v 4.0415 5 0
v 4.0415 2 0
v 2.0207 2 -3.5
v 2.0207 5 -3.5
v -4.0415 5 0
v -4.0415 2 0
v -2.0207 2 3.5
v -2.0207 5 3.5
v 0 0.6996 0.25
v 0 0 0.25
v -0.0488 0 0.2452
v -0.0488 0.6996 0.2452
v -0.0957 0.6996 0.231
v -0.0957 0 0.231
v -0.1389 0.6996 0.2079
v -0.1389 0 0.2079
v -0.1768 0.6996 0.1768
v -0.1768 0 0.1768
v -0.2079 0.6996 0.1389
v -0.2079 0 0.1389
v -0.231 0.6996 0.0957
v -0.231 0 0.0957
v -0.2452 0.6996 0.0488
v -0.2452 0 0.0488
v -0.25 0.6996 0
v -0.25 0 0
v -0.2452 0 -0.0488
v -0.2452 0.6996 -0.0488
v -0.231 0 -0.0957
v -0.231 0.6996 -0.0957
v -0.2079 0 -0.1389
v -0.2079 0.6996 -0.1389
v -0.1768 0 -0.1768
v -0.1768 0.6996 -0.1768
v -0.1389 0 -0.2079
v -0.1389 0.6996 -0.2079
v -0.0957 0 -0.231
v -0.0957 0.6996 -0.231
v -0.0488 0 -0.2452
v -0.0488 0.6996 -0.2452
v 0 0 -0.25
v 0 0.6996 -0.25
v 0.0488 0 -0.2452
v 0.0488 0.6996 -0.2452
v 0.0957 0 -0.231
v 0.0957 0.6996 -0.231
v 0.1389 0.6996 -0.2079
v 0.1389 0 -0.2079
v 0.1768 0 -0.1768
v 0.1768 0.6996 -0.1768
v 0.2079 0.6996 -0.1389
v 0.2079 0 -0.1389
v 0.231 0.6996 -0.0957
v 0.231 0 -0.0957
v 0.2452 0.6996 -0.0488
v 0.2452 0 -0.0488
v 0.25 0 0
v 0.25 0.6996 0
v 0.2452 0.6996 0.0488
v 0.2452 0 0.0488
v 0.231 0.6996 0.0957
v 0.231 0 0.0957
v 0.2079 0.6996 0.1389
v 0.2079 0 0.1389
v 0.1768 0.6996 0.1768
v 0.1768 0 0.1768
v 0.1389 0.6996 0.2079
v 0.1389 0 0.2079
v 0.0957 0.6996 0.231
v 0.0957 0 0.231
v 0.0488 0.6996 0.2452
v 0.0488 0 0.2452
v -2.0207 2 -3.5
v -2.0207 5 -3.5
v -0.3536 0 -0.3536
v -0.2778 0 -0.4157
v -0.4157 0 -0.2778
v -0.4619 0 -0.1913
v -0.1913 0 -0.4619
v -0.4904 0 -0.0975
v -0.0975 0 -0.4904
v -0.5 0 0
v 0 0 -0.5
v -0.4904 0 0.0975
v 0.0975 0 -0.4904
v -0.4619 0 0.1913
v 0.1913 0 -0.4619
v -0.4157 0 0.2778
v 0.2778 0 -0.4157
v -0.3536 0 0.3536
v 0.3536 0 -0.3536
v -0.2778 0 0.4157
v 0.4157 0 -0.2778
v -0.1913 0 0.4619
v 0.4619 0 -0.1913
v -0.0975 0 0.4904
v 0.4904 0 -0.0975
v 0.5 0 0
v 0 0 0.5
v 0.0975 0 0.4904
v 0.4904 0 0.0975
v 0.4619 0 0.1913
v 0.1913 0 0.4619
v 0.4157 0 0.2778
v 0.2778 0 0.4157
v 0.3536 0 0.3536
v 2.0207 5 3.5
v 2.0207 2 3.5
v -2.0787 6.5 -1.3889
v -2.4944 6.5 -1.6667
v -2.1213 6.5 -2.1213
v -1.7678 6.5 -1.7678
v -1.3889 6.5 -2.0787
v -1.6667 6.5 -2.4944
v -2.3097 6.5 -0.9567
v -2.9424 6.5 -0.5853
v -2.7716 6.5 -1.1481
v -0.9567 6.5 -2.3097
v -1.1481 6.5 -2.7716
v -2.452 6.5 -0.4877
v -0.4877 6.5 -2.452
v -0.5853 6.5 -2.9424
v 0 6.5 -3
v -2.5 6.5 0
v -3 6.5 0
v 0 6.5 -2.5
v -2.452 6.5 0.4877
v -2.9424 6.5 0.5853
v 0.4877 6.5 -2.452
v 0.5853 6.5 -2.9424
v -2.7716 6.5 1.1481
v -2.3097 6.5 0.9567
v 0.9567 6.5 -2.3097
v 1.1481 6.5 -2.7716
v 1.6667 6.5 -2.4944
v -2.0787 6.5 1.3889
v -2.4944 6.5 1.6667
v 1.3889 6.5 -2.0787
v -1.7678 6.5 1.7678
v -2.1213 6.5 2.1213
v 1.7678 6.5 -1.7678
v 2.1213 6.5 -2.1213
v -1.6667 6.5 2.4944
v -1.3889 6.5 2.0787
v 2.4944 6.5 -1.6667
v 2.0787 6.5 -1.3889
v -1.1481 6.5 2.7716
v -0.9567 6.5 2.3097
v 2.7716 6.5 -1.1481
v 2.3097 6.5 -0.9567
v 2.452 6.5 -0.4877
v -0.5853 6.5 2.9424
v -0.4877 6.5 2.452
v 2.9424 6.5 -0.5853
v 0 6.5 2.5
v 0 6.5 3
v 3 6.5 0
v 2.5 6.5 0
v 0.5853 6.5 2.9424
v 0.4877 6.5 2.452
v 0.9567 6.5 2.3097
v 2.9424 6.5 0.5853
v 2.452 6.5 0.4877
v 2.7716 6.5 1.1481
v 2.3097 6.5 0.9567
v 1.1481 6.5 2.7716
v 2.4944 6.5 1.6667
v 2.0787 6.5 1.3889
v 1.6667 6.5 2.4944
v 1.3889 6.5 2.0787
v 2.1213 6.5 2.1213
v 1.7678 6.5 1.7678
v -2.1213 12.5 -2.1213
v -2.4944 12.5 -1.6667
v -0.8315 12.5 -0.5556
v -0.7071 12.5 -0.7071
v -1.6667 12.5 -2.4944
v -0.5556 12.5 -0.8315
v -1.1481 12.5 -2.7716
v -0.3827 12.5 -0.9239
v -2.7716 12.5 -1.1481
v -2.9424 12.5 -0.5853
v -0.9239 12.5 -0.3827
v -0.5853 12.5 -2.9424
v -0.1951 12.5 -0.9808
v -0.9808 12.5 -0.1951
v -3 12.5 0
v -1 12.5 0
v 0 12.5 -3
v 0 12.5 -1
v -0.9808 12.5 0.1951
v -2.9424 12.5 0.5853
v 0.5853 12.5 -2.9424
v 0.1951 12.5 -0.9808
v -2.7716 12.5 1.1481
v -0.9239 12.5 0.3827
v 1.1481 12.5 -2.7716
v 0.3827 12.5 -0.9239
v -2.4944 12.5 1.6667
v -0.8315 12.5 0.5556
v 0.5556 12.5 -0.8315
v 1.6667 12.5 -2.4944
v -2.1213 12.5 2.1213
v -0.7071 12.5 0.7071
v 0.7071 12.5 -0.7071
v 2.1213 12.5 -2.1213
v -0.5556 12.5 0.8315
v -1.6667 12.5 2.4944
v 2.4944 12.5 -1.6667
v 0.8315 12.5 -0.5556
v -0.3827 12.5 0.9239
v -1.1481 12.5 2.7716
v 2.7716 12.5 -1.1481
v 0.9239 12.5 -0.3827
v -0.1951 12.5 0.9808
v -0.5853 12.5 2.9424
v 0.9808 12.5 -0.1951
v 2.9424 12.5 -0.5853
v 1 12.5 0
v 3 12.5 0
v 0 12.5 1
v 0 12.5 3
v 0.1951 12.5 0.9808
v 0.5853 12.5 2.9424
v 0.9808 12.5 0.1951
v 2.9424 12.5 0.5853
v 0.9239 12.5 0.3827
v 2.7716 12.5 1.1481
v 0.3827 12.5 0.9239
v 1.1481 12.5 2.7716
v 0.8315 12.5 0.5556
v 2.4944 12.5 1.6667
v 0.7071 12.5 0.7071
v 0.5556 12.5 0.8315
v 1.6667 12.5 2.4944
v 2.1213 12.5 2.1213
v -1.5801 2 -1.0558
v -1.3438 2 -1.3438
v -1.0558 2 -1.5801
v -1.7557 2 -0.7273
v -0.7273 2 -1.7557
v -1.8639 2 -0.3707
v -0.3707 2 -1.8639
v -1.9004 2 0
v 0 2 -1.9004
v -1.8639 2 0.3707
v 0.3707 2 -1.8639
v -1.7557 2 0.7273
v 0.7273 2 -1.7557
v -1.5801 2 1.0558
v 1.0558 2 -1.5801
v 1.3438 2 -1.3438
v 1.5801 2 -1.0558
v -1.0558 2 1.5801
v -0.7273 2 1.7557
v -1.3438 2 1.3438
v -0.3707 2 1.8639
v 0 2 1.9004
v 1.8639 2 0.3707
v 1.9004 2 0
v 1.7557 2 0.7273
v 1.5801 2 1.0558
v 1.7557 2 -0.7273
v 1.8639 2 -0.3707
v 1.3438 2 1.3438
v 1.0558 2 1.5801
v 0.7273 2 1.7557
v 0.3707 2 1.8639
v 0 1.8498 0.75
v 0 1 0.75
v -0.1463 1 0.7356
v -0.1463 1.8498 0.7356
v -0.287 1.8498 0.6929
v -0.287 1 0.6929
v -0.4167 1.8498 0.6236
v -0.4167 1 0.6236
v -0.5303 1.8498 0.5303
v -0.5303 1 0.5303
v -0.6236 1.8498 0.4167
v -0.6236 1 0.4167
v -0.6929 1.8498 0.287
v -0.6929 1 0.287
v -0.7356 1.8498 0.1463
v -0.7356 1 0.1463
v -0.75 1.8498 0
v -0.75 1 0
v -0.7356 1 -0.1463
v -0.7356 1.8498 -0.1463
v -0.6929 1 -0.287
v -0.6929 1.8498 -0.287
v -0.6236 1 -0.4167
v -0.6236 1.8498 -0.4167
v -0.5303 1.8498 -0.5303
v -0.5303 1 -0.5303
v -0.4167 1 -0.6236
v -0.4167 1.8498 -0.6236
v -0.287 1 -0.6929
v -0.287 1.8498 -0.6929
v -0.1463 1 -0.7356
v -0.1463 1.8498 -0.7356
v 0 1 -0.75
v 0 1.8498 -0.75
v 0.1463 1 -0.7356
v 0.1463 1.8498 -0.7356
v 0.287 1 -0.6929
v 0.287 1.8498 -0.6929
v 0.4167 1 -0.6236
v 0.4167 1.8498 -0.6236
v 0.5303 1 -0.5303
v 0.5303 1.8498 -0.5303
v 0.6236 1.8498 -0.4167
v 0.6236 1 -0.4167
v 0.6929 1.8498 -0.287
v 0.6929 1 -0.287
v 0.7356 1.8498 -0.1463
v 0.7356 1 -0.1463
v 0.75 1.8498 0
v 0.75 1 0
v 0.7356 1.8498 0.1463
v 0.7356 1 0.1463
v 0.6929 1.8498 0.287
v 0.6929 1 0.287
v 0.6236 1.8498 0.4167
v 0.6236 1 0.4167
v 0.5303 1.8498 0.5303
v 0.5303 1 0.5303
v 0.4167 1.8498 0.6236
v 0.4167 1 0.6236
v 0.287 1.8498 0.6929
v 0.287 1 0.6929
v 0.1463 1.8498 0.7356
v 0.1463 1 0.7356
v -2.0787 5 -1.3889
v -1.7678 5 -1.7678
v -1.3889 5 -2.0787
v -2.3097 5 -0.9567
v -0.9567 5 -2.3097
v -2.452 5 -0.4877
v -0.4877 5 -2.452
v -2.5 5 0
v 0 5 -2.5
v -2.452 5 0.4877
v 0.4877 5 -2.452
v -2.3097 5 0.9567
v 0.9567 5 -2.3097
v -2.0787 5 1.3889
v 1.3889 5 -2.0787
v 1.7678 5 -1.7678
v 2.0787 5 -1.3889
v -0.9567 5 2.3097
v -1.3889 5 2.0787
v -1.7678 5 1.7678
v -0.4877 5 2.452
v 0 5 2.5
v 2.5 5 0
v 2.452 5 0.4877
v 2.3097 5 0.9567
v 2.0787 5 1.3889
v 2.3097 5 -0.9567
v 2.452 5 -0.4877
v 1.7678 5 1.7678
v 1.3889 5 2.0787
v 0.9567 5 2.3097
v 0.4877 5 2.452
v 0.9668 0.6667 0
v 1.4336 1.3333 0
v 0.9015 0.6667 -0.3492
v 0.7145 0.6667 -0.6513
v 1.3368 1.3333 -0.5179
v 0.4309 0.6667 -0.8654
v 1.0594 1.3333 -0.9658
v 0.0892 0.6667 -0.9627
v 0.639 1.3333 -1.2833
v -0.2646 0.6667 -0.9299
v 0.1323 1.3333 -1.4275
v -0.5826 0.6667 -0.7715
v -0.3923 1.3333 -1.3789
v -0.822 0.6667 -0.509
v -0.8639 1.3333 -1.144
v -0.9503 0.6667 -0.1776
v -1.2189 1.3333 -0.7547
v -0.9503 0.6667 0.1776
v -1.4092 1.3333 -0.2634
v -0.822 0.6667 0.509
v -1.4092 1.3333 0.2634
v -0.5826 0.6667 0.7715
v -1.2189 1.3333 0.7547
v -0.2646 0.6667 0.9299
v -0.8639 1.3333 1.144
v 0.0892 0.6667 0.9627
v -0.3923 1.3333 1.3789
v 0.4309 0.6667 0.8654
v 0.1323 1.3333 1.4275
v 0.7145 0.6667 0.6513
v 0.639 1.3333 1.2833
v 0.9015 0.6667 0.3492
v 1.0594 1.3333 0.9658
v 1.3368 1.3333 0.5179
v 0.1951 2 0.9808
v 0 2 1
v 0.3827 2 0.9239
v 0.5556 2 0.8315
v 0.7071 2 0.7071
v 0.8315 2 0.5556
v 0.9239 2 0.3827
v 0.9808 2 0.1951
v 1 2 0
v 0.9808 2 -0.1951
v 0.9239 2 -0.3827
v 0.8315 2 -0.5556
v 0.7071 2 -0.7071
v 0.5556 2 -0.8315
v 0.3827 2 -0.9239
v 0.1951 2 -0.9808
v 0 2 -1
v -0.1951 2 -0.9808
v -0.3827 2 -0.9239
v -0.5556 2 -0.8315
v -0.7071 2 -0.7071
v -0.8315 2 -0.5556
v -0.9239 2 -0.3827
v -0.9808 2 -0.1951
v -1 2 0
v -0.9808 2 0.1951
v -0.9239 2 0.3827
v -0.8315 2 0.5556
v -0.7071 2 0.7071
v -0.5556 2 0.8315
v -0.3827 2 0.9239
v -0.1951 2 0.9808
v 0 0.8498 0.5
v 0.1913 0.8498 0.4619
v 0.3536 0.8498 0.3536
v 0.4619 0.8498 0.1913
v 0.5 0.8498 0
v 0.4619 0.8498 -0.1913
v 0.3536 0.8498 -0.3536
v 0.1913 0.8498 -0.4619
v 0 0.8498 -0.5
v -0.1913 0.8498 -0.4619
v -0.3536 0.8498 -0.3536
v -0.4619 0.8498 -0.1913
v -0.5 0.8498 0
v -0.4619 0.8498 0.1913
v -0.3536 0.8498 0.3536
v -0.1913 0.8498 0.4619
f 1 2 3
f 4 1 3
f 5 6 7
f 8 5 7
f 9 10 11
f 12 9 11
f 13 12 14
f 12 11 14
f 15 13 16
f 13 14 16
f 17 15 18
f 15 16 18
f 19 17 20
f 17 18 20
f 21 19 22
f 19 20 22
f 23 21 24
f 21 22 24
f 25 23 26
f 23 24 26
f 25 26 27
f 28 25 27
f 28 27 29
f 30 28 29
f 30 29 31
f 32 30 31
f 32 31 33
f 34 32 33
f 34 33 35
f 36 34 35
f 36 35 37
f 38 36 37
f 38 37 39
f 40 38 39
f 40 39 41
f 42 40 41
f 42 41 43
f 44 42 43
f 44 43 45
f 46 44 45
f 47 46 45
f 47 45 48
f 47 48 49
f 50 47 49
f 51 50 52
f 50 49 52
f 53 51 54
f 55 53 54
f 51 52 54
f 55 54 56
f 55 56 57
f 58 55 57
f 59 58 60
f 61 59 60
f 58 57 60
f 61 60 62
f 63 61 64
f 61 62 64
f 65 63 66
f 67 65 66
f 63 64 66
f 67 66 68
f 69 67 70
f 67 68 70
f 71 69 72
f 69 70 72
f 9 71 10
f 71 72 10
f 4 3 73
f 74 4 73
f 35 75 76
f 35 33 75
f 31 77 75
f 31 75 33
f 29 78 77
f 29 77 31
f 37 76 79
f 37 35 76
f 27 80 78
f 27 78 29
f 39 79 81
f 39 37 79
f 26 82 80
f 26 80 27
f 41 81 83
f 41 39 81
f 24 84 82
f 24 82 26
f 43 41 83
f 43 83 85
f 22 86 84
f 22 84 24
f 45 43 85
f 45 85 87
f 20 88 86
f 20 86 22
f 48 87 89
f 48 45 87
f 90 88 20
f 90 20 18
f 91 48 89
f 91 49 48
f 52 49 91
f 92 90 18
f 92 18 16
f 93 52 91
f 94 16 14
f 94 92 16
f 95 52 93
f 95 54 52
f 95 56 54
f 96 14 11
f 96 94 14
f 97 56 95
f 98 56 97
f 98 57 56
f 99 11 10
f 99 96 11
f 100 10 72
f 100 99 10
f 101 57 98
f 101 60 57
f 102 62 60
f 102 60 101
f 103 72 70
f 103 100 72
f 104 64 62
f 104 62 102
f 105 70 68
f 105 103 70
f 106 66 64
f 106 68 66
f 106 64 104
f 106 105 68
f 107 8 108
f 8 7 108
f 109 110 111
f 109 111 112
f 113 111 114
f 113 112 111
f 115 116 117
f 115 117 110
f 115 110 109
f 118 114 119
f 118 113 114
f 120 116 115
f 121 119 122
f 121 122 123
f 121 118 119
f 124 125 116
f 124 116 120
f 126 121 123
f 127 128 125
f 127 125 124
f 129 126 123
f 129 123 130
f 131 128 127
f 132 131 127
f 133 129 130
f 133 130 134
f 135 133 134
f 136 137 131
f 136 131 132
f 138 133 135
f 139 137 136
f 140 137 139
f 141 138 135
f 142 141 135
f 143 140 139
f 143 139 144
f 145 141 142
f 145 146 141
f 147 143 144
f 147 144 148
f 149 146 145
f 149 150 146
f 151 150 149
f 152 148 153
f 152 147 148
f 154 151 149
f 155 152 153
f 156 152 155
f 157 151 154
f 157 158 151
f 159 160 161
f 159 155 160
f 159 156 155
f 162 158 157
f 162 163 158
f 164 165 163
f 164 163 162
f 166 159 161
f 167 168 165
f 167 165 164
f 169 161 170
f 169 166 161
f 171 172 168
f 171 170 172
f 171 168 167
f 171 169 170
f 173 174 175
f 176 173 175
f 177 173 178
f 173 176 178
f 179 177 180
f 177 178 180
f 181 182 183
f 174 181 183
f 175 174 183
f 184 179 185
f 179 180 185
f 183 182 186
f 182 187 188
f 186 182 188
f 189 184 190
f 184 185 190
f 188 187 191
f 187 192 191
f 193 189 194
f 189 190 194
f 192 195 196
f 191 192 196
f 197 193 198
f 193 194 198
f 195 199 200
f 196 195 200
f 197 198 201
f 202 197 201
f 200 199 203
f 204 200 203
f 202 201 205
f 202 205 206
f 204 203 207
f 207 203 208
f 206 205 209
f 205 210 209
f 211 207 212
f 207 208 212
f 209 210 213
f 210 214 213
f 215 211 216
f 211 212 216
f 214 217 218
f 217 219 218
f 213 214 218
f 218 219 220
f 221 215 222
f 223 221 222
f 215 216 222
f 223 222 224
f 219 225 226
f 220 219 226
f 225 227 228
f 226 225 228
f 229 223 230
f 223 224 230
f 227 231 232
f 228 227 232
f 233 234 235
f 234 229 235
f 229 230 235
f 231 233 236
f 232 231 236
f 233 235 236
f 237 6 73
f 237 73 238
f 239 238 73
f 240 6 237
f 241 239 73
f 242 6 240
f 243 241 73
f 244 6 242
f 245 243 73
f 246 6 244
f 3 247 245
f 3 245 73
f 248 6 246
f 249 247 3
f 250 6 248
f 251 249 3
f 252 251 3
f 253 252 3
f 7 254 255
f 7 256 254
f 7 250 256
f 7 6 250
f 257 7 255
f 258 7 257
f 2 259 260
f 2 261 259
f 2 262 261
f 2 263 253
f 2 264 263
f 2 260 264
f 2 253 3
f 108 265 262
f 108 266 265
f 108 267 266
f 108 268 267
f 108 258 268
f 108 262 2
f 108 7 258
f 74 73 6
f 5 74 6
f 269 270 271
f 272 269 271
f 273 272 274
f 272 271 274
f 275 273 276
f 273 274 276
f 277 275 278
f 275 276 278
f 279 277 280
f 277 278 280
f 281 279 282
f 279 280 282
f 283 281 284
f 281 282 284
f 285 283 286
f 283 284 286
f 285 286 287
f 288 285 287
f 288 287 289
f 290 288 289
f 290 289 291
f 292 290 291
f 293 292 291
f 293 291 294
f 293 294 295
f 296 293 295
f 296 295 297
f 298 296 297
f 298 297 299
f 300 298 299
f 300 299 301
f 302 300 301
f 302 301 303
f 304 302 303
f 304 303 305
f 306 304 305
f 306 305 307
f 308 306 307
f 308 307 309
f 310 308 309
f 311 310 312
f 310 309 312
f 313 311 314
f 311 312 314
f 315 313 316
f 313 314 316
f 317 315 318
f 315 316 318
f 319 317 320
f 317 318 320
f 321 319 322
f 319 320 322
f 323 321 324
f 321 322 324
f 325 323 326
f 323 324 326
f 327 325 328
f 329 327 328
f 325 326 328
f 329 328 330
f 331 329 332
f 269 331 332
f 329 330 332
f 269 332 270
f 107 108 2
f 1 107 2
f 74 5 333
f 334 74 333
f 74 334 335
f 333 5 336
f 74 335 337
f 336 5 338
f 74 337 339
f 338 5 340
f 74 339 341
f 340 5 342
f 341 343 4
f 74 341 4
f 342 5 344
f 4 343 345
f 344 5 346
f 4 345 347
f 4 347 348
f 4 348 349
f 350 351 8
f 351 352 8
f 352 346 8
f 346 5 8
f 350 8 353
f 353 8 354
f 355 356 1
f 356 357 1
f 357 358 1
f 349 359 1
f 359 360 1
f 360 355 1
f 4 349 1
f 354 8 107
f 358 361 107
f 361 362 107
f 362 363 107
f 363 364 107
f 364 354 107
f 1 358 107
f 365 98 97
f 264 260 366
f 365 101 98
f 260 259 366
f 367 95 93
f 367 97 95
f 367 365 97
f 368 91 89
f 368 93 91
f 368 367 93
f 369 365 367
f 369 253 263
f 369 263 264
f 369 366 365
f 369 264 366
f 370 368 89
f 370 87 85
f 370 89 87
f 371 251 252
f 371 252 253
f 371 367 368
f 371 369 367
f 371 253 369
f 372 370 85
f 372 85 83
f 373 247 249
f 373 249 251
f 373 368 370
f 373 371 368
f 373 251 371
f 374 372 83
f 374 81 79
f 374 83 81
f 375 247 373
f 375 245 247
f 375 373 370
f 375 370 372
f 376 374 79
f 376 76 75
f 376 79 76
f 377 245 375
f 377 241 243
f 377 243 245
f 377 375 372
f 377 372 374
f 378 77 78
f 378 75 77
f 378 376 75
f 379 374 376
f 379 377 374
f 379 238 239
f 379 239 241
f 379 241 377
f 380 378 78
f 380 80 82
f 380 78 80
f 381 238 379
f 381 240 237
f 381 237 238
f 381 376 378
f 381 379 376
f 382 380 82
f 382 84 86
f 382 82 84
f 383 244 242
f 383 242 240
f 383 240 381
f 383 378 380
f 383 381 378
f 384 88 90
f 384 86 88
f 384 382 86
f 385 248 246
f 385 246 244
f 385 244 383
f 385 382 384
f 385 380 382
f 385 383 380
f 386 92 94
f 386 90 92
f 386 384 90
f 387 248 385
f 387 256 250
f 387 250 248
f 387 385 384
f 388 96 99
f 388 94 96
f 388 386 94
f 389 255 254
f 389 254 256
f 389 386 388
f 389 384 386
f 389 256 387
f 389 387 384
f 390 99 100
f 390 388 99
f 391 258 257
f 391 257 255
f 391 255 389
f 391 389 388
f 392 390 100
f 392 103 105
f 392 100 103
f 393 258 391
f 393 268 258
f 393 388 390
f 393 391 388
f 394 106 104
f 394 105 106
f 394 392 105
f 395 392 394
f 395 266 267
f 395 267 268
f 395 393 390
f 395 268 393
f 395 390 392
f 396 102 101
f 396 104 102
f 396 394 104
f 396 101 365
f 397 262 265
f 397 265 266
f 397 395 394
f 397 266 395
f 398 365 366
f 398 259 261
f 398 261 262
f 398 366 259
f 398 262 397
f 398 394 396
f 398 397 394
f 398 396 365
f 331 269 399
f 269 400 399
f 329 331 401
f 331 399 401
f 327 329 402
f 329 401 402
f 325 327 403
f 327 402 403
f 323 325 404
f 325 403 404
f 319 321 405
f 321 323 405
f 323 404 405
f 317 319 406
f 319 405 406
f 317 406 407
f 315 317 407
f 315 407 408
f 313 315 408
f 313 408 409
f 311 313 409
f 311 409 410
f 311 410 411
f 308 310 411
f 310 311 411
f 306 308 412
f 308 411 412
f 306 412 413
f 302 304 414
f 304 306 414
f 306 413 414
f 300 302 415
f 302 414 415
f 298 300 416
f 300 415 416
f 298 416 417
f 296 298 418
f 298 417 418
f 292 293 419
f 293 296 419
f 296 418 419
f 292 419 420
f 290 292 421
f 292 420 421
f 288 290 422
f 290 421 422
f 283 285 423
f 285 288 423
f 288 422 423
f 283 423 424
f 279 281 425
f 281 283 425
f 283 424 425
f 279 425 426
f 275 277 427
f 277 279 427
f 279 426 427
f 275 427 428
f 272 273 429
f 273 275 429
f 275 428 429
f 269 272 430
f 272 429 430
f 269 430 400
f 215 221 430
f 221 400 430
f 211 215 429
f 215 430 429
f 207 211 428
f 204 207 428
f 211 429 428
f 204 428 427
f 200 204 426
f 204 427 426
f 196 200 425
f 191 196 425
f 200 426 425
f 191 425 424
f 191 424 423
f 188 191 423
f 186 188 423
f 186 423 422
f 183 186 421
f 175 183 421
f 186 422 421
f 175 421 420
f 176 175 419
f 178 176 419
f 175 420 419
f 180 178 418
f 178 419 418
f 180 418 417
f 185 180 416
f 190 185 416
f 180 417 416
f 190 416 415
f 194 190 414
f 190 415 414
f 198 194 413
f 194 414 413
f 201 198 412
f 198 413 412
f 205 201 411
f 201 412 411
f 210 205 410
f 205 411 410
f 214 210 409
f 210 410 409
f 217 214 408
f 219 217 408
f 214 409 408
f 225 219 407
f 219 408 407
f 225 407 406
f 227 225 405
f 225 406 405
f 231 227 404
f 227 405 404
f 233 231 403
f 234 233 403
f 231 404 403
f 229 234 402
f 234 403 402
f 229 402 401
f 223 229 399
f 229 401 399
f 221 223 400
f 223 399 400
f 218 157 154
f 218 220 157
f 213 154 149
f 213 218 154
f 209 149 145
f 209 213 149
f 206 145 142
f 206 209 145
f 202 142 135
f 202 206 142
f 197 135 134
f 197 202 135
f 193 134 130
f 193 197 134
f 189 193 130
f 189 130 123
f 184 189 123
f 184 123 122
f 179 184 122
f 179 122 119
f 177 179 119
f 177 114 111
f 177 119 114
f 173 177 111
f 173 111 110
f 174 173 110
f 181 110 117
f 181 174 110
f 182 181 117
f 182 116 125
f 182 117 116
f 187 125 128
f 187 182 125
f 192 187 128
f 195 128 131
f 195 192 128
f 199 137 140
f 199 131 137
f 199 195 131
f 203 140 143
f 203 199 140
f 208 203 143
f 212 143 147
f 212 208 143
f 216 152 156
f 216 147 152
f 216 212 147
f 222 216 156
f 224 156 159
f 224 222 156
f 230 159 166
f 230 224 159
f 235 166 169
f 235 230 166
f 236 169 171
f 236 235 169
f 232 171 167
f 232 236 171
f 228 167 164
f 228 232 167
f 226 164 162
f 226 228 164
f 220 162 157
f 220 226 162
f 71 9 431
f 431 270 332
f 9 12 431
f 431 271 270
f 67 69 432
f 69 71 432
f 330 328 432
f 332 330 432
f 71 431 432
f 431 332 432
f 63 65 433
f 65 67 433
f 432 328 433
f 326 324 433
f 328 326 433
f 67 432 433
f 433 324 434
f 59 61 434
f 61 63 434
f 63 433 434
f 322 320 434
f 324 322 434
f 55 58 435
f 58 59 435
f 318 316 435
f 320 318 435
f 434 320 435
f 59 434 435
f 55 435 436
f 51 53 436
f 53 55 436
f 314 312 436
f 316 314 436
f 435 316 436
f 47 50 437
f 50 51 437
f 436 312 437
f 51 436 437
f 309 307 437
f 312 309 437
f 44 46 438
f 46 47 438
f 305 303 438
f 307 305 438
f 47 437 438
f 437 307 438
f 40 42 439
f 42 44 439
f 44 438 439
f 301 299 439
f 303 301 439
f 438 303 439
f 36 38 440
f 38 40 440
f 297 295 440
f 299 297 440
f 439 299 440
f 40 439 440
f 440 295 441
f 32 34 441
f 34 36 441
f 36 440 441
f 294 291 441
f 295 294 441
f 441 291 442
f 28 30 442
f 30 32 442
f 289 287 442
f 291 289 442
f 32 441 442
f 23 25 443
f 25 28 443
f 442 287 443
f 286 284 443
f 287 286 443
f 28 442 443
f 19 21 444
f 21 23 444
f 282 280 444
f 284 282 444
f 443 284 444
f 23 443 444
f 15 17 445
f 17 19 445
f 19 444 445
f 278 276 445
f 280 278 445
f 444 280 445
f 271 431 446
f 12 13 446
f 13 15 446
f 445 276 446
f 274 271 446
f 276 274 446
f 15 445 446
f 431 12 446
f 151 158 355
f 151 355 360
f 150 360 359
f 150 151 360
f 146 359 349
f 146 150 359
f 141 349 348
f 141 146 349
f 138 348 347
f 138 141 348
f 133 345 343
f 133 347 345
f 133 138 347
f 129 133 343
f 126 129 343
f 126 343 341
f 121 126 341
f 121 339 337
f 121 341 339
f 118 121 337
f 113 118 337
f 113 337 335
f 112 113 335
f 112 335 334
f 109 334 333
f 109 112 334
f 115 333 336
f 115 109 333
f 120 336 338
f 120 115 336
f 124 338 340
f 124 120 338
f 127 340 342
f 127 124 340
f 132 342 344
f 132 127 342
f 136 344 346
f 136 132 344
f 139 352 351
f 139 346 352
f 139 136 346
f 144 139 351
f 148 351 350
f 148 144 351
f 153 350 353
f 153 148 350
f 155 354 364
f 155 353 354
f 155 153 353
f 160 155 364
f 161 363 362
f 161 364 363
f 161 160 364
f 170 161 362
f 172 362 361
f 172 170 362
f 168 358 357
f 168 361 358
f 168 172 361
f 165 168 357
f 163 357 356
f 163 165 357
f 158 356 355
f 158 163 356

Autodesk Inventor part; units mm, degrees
ref_plane "YZ Plane" through (0, 0, 0) normal (1, 0, 0) x (0, 1, 0)
ref_plane "XZ Plane" through (0, 0, 0) normal (0, 1, 0) x (-1, 0, 0)
ref_plane "XY Plane" through (0, 0, 0) normal (0, 0, 1) x (1, 0, 0)
sketch "Sketch1" plane through (0, 0, 0) normal (0, 0, 1) x (1, 0, 0)
  line L0 (0, 0) -> (0.5, 0)
  line L1 (0.5, 0) -> (1.9004, 2)
  line L2 (1.9004, 2) -> (7, 2)
  line L3 (7, 2) -> (7, 5)
  line L4 (7, 5) -> (2.5, 5)
  line L5 (2.5, 5) -> (2.5, 6.5)
  line L6 (2.5, 6.5) -> (3, 6.5)
  line L7 (3, 6.5) -> (3, 12.5)
  line L8 (3, 12.5) -> (0, 12.5)
  line L9 (0, 12.5) -> (0, 0)
  dimension "d0" = 0.5
  dimension "d1" = 125
  dimension "d2" = 6
  dimension "d3" = 7.5
  dimension "d4" = 10.5
  dimension "d5" = 12.5
  dimension "d6" = 3
  dimension "d7" = 2.5
  dimension "d8" = 7
revolve "Revolution1" add sketch "Sketch1" angle 360 about axis through (0, 12.5, 0) along (0, -1, 0)
sketch "Sketch2" plane through (0, 2, 0) normal (0, -1, 0) x (1, 0, 0)
  circle A0 centre (0, 0) radius 2.5 projected
  circle A1 centre (0, 0) radius 7 projected
  circle A2 centre (0, 0) radius 0.5 projected
  line L0 (2.0207, 3.5) -> (4.0415, 0)
  line L1 (4.0415, 0) -> (2.0207, -3.5)
  line L2 (2.0207, -3.5) -> (-2.0207, -3.5)
  line L3 (-2.0207, -3.5) -> (-4.0415, 0)
  line L4 (-4.0415, 0) -> (-2.0207, 3.5)
  line L5 (-2.0207, 3.5) -> (2.0207, 3.5)
  point P0 (0, 0)
  dimension "d10" = 7
  dimension "d11" = 3.5
extrude "Extrusion1" cut sketch "Sketch2" against normal blind 10 contours A1
thread "Thread1" size "M6x1" class "6g" standard "ANSI Metric M Profile" full length
hole "Hole1" at (0, 12.5, 0) direction (0, -1, 0) diameter 2 depth 10.5 tip angle 118
hole "Hole2" at (0, 12.5, 0) direction (0, -1, 0) diameter 0.5 end through all
hole "Hole3" at (0, 12.5, 0) direction (0, -1, 0) diameter 1.5 depth 11.5 tip angle 118
properties part number "Nozzle" material "Brass, Soft Yellow"
